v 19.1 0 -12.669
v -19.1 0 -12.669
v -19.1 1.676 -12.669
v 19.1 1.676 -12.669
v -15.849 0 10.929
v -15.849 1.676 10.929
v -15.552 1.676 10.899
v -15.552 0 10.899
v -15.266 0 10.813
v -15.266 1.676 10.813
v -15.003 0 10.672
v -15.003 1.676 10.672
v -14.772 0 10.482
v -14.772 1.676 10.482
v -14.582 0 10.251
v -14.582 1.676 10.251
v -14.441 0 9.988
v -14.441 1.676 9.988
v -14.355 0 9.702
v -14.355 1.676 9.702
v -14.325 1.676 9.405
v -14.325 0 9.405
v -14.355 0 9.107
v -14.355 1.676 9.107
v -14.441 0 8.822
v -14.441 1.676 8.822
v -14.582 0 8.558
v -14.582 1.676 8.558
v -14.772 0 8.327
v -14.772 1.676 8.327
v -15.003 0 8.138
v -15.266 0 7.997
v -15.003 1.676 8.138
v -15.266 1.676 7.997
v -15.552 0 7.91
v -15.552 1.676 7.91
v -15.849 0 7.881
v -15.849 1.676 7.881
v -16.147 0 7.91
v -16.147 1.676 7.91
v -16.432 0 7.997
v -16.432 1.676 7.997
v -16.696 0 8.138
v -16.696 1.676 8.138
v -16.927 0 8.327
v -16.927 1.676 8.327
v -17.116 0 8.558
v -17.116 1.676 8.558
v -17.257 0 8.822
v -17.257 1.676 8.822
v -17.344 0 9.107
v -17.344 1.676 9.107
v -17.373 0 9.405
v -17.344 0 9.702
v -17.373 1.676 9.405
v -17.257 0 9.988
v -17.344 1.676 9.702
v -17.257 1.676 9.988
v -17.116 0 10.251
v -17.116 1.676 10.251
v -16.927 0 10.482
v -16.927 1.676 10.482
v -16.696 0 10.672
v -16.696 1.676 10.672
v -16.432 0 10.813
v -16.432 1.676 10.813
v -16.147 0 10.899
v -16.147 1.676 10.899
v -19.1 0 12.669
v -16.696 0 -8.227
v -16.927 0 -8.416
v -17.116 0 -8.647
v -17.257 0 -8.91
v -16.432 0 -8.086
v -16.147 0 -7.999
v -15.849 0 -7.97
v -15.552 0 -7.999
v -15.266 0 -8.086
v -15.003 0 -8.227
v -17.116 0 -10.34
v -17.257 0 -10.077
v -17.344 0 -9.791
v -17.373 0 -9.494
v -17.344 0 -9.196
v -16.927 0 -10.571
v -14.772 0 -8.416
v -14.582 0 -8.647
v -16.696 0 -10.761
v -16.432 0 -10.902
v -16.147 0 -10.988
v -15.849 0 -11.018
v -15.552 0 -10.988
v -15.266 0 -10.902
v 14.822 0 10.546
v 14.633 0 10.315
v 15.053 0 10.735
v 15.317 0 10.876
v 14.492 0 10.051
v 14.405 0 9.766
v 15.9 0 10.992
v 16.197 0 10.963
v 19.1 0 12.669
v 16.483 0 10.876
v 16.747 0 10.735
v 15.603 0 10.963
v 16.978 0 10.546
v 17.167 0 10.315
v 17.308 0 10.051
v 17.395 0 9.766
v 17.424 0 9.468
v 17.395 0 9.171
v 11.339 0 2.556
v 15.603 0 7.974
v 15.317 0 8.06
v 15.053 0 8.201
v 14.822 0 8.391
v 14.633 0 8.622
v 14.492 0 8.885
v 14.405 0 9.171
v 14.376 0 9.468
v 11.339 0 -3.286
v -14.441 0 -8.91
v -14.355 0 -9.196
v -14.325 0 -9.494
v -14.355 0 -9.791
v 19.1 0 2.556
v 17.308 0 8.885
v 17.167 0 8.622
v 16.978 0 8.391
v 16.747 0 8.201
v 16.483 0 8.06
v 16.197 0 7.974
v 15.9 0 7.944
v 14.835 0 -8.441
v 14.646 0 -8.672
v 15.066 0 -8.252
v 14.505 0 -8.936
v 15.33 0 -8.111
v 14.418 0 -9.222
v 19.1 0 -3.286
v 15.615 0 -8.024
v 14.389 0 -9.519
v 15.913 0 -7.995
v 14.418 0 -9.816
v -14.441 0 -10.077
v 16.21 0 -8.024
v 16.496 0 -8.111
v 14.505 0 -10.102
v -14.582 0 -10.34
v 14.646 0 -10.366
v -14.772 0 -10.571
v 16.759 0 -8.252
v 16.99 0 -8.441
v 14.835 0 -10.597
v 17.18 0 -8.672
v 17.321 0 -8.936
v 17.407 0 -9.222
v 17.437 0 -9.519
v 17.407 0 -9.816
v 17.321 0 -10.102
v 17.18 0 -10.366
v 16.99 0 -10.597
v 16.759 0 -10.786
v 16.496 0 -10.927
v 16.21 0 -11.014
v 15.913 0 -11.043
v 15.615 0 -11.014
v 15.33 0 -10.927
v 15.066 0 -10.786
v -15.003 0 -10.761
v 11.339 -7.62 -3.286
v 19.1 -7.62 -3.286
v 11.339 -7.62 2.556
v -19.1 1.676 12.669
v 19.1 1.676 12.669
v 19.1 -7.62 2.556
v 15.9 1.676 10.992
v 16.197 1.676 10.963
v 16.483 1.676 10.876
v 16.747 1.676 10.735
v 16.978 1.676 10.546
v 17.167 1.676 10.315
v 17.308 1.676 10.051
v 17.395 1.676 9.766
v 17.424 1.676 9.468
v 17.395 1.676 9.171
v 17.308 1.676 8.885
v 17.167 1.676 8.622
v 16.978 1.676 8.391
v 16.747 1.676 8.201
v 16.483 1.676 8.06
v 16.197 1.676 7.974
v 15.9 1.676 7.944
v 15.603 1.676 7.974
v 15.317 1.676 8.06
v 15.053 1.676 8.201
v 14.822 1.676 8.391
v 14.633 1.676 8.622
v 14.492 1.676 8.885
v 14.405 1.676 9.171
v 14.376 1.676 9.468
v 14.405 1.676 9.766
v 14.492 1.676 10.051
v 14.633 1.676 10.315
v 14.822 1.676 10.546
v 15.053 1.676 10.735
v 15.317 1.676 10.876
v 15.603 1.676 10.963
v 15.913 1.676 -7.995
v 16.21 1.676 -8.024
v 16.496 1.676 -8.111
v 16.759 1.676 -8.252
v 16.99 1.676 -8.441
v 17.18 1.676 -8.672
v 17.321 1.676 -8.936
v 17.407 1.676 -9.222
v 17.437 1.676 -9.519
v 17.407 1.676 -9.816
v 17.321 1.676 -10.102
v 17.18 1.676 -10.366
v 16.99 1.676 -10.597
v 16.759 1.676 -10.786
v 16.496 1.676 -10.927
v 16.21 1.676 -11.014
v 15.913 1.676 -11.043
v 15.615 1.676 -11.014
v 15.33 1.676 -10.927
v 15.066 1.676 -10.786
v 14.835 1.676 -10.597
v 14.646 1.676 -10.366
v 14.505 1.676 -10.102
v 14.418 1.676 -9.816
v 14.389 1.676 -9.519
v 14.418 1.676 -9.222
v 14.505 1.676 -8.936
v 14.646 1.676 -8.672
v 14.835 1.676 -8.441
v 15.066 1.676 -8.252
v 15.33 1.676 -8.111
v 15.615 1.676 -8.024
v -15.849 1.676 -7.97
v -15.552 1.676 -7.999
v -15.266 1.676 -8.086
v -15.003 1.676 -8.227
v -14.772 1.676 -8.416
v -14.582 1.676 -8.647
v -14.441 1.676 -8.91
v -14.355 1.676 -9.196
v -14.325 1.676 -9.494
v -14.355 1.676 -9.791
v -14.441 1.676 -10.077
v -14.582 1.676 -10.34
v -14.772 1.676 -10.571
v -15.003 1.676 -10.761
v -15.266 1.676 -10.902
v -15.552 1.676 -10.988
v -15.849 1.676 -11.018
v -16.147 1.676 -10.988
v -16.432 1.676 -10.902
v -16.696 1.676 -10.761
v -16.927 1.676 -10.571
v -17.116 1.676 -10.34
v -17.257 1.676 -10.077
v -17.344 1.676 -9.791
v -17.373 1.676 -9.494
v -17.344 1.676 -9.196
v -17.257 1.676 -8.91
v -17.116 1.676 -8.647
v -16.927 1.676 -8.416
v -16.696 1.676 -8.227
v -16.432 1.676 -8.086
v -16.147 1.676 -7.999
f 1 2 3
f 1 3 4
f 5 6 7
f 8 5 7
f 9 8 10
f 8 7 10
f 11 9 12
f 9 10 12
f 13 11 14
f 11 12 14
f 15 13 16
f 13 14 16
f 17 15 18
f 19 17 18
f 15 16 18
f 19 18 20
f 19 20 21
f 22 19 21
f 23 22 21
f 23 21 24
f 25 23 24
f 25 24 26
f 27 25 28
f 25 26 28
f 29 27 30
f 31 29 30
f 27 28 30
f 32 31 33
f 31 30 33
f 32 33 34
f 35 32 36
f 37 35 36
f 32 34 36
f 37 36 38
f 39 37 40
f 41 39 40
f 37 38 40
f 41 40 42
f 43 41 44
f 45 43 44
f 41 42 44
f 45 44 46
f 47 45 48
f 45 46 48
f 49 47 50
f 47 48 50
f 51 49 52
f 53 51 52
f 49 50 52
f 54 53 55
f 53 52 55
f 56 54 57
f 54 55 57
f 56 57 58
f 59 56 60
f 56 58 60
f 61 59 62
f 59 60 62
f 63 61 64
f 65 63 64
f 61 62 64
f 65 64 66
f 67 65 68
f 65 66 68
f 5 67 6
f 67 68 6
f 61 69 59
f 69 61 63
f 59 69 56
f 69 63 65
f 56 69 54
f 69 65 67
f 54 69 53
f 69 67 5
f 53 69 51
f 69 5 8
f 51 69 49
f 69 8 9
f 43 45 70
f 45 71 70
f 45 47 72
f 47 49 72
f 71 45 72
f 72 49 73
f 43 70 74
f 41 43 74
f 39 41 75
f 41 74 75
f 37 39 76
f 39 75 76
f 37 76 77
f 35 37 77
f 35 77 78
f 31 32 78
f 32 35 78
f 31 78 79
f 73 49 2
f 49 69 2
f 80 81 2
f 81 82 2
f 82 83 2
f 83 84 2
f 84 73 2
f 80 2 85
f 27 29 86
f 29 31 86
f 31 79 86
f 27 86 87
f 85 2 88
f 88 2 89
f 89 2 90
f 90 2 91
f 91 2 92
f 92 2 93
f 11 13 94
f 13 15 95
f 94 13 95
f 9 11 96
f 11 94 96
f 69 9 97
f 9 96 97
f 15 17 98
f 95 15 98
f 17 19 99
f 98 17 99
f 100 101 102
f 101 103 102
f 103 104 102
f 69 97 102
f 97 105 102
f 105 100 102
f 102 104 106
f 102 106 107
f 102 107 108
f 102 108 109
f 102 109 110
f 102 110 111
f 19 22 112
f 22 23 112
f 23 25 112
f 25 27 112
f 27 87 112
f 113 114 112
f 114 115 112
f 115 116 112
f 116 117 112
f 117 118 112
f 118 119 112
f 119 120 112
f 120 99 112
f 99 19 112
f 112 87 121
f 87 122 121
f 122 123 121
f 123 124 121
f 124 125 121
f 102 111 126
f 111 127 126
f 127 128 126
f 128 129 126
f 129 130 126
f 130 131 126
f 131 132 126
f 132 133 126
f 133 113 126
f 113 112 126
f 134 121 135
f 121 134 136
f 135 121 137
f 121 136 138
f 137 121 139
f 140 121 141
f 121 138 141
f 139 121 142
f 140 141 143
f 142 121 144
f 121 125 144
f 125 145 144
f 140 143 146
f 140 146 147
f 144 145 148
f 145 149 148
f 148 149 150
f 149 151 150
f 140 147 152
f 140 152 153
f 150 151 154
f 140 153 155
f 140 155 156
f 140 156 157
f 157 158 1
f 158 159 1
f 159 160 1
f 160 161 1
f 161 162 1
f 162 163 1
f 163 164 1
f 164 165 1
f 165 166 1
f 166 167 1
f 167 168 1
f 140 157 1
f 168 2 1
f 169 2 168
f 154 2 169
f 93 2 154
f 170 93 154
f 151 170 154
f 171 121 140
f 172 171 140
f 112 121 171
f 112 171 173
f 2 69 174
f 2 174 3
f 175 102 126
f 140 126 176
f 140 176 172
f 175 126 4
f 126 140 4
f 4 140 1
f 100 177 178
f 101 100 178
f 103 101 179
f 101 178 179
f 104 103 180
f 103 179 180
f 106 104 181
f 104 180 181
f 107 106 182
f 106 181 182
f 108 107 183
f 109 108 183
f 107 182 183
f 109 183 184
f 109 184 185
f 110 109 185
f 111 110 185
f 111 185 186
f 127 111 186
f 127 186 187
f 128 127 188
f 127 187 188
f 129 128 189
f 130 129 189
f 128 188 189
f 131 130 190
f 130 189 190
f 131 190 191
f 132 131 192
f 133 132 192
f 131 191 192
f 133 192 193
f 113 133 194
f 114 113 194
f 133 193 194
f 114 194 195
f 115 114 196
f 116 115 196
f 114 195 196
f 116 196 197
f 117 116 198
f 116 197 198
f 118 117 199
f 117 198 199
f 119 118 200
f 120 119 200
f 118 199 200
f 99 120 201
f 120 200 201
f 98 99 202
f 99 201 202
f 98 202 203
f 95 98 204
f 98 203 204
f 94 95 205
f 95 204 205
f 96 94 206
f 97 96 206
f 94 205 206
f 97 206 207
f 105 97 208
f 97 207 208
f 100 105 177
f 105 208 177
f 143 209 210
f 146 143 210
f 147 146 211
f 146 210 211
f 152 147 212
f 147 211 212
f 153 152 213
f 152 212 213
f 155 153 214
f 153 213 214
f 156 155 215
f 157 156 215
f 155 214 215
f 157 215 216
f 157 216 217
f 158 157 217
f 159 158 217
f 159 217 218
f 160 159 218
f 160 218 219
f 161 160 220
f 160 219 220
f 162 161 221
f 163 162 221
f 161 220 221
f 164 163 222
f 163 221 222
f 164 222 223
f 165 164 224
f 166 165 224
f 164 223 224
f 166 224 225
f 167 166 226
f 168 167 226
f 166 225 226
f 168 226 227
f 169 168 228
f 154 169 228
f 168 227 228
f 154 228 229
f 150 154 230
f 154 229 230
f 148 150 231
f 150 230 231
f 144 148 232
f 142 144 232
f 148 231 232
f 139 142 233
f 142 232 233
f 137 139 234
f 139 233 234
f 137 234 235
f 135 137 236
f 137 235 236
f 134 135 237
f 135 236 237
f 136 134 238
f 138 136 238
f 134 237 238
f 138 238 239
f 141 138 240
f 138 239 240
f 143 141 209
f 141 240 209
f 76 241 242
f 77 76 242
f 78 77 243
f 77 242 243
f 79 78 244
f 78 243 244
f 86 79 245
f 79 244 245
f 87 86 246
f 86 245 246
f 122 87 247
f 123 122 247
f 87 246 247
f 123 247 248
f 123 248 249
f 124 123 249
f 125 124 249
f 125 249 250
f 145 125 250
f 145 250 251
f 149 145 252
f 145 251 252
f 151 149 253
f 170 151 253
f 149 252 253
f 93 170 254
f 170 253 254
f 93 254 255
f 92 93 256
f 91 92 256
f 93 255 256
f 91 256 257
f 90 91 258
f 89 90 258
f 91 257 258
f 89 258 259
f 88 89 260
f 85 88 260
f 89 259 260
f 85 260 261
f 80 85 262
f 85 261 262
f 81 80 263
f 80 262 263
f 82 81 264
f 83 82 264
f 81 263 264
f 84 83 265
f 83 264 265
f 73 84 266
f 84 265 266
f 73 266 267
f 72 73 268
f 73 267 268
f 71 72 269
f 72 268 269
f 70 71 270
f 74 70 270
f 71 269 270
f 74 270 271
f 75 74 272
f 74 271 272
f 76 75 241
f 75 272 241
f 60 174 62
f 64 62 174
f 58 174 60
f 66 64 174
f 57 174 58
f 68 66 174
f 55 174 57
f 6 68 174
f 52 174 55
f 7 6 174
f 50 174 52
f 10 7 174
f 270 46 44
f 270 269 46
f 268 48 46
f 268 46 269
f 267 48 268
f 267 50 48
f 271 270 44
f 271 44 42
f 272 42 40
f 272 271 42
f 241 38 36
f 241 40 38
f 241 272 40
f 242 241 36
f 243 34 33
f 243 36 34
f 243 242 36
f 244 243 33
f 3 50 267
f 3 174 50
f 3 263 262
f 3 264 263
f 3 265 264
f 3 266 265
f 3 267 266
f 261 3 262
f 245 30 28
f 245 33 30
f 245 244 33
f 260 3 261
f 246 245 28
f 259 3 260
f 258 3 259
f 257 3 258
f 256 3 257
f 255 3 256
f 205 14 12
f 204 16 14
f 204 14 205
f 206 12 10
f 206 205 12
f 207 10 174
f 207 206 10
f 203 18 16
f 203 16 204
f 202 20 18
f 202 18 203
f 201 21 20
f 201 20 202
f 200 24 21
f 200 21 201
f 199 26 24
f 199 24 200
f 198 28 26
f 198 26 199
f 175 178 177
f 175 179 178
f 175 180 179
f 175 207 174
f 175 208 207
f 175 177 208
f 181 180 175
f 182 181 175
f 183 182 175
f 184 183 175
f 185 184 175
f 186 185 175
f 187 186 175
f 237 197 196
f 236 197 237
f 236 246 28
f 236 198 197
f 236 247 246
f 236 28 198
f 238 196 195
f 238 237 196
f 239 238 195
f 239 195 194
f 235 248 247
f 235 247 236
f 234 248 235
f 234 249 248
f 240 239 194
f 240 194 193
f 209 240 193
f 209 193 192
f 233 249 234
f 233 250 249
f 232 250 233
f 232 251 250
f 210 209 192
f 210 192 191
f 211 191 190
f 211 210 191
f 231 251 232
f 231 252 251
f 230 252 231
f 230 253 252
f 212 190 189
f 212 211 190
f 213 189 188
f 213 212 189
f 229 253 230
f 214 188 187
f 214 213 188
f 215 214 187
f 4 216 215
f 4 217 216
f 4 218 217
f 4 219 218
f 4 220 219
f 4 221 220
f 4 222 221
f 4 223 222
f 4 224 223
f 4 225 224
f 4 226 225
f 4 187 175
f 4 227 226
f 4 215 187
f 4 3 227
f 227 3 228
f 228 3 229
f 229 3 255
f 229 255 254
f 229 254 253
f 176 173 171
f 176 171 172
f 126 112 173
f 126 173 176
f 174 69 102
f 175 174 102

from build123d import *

# Parameters (mm, degrees)
SKETCH1_W           = 38.200952294
SKETCH1_H           = 25.337366318
BOSS_EXTRUDE1_DEPTH = 1.6764
SKETCH2_R           = 1.524
CUT_EXTRUDE1_DEPTH  = 1.6764
SKETCH5_W           = 7.761339033
SKETCH5_H           = 5.842
BOSS_EXTRUDE2_DEPTH = 7.62


with BuildPart() as part:
    # Sketch1 → Boss-Extrude1 (new body)
    with BuildSketch(Plane(origin=(0, 0, 0), x_dir=(1, 0, 0), z_dir=(0, 1, 0))):
        Rectangle(SKETCH1_W, SKETCH1_H)
    extrude(amount=BOSS_EXTRUDE1_DEPTH)

    # Sketch2 → Cut-Extrude1 (cut)
    with BuildSketch(Plane(origin=(0, 1.6764, 0), x_dir=(1, 0, 0), z_dir=(0, 1, 0))):
        with Locations(Location((-15.849276147, -9.404783159, 0), (0, 0, 270))):
            Circle(SKETCH2_R)
        with Locations(Location((-15.849276147, 9.493683159, 0), (0, 0, 270))):
            Circle(SKETCH2_R)
        with Locations(Location((15.912776147, 9.519083159, 0), (0, 0, 270))):
            Circle(SKETCH2_R)
        with Locations(Location((15.900076147, -9.468283159, 0), (0, 0, 270))):
            Circle(SKETCH2_R)
    extrude(amount=-CUT_EXTRUDE1_DEPTH, mode=Mode.SUBTRACT)

    # Sketch5 → Boss-Extrude2 (add)
    with BuildSketch(Plane.XZ):
        with Locations((15.219806631, -0.36511235)):
            Rectangle(SKETCH5_W, SKETCH5_H)
    extrude(amount=BOSS_EXTRUDE2_DEPTH)


solid = part.part
